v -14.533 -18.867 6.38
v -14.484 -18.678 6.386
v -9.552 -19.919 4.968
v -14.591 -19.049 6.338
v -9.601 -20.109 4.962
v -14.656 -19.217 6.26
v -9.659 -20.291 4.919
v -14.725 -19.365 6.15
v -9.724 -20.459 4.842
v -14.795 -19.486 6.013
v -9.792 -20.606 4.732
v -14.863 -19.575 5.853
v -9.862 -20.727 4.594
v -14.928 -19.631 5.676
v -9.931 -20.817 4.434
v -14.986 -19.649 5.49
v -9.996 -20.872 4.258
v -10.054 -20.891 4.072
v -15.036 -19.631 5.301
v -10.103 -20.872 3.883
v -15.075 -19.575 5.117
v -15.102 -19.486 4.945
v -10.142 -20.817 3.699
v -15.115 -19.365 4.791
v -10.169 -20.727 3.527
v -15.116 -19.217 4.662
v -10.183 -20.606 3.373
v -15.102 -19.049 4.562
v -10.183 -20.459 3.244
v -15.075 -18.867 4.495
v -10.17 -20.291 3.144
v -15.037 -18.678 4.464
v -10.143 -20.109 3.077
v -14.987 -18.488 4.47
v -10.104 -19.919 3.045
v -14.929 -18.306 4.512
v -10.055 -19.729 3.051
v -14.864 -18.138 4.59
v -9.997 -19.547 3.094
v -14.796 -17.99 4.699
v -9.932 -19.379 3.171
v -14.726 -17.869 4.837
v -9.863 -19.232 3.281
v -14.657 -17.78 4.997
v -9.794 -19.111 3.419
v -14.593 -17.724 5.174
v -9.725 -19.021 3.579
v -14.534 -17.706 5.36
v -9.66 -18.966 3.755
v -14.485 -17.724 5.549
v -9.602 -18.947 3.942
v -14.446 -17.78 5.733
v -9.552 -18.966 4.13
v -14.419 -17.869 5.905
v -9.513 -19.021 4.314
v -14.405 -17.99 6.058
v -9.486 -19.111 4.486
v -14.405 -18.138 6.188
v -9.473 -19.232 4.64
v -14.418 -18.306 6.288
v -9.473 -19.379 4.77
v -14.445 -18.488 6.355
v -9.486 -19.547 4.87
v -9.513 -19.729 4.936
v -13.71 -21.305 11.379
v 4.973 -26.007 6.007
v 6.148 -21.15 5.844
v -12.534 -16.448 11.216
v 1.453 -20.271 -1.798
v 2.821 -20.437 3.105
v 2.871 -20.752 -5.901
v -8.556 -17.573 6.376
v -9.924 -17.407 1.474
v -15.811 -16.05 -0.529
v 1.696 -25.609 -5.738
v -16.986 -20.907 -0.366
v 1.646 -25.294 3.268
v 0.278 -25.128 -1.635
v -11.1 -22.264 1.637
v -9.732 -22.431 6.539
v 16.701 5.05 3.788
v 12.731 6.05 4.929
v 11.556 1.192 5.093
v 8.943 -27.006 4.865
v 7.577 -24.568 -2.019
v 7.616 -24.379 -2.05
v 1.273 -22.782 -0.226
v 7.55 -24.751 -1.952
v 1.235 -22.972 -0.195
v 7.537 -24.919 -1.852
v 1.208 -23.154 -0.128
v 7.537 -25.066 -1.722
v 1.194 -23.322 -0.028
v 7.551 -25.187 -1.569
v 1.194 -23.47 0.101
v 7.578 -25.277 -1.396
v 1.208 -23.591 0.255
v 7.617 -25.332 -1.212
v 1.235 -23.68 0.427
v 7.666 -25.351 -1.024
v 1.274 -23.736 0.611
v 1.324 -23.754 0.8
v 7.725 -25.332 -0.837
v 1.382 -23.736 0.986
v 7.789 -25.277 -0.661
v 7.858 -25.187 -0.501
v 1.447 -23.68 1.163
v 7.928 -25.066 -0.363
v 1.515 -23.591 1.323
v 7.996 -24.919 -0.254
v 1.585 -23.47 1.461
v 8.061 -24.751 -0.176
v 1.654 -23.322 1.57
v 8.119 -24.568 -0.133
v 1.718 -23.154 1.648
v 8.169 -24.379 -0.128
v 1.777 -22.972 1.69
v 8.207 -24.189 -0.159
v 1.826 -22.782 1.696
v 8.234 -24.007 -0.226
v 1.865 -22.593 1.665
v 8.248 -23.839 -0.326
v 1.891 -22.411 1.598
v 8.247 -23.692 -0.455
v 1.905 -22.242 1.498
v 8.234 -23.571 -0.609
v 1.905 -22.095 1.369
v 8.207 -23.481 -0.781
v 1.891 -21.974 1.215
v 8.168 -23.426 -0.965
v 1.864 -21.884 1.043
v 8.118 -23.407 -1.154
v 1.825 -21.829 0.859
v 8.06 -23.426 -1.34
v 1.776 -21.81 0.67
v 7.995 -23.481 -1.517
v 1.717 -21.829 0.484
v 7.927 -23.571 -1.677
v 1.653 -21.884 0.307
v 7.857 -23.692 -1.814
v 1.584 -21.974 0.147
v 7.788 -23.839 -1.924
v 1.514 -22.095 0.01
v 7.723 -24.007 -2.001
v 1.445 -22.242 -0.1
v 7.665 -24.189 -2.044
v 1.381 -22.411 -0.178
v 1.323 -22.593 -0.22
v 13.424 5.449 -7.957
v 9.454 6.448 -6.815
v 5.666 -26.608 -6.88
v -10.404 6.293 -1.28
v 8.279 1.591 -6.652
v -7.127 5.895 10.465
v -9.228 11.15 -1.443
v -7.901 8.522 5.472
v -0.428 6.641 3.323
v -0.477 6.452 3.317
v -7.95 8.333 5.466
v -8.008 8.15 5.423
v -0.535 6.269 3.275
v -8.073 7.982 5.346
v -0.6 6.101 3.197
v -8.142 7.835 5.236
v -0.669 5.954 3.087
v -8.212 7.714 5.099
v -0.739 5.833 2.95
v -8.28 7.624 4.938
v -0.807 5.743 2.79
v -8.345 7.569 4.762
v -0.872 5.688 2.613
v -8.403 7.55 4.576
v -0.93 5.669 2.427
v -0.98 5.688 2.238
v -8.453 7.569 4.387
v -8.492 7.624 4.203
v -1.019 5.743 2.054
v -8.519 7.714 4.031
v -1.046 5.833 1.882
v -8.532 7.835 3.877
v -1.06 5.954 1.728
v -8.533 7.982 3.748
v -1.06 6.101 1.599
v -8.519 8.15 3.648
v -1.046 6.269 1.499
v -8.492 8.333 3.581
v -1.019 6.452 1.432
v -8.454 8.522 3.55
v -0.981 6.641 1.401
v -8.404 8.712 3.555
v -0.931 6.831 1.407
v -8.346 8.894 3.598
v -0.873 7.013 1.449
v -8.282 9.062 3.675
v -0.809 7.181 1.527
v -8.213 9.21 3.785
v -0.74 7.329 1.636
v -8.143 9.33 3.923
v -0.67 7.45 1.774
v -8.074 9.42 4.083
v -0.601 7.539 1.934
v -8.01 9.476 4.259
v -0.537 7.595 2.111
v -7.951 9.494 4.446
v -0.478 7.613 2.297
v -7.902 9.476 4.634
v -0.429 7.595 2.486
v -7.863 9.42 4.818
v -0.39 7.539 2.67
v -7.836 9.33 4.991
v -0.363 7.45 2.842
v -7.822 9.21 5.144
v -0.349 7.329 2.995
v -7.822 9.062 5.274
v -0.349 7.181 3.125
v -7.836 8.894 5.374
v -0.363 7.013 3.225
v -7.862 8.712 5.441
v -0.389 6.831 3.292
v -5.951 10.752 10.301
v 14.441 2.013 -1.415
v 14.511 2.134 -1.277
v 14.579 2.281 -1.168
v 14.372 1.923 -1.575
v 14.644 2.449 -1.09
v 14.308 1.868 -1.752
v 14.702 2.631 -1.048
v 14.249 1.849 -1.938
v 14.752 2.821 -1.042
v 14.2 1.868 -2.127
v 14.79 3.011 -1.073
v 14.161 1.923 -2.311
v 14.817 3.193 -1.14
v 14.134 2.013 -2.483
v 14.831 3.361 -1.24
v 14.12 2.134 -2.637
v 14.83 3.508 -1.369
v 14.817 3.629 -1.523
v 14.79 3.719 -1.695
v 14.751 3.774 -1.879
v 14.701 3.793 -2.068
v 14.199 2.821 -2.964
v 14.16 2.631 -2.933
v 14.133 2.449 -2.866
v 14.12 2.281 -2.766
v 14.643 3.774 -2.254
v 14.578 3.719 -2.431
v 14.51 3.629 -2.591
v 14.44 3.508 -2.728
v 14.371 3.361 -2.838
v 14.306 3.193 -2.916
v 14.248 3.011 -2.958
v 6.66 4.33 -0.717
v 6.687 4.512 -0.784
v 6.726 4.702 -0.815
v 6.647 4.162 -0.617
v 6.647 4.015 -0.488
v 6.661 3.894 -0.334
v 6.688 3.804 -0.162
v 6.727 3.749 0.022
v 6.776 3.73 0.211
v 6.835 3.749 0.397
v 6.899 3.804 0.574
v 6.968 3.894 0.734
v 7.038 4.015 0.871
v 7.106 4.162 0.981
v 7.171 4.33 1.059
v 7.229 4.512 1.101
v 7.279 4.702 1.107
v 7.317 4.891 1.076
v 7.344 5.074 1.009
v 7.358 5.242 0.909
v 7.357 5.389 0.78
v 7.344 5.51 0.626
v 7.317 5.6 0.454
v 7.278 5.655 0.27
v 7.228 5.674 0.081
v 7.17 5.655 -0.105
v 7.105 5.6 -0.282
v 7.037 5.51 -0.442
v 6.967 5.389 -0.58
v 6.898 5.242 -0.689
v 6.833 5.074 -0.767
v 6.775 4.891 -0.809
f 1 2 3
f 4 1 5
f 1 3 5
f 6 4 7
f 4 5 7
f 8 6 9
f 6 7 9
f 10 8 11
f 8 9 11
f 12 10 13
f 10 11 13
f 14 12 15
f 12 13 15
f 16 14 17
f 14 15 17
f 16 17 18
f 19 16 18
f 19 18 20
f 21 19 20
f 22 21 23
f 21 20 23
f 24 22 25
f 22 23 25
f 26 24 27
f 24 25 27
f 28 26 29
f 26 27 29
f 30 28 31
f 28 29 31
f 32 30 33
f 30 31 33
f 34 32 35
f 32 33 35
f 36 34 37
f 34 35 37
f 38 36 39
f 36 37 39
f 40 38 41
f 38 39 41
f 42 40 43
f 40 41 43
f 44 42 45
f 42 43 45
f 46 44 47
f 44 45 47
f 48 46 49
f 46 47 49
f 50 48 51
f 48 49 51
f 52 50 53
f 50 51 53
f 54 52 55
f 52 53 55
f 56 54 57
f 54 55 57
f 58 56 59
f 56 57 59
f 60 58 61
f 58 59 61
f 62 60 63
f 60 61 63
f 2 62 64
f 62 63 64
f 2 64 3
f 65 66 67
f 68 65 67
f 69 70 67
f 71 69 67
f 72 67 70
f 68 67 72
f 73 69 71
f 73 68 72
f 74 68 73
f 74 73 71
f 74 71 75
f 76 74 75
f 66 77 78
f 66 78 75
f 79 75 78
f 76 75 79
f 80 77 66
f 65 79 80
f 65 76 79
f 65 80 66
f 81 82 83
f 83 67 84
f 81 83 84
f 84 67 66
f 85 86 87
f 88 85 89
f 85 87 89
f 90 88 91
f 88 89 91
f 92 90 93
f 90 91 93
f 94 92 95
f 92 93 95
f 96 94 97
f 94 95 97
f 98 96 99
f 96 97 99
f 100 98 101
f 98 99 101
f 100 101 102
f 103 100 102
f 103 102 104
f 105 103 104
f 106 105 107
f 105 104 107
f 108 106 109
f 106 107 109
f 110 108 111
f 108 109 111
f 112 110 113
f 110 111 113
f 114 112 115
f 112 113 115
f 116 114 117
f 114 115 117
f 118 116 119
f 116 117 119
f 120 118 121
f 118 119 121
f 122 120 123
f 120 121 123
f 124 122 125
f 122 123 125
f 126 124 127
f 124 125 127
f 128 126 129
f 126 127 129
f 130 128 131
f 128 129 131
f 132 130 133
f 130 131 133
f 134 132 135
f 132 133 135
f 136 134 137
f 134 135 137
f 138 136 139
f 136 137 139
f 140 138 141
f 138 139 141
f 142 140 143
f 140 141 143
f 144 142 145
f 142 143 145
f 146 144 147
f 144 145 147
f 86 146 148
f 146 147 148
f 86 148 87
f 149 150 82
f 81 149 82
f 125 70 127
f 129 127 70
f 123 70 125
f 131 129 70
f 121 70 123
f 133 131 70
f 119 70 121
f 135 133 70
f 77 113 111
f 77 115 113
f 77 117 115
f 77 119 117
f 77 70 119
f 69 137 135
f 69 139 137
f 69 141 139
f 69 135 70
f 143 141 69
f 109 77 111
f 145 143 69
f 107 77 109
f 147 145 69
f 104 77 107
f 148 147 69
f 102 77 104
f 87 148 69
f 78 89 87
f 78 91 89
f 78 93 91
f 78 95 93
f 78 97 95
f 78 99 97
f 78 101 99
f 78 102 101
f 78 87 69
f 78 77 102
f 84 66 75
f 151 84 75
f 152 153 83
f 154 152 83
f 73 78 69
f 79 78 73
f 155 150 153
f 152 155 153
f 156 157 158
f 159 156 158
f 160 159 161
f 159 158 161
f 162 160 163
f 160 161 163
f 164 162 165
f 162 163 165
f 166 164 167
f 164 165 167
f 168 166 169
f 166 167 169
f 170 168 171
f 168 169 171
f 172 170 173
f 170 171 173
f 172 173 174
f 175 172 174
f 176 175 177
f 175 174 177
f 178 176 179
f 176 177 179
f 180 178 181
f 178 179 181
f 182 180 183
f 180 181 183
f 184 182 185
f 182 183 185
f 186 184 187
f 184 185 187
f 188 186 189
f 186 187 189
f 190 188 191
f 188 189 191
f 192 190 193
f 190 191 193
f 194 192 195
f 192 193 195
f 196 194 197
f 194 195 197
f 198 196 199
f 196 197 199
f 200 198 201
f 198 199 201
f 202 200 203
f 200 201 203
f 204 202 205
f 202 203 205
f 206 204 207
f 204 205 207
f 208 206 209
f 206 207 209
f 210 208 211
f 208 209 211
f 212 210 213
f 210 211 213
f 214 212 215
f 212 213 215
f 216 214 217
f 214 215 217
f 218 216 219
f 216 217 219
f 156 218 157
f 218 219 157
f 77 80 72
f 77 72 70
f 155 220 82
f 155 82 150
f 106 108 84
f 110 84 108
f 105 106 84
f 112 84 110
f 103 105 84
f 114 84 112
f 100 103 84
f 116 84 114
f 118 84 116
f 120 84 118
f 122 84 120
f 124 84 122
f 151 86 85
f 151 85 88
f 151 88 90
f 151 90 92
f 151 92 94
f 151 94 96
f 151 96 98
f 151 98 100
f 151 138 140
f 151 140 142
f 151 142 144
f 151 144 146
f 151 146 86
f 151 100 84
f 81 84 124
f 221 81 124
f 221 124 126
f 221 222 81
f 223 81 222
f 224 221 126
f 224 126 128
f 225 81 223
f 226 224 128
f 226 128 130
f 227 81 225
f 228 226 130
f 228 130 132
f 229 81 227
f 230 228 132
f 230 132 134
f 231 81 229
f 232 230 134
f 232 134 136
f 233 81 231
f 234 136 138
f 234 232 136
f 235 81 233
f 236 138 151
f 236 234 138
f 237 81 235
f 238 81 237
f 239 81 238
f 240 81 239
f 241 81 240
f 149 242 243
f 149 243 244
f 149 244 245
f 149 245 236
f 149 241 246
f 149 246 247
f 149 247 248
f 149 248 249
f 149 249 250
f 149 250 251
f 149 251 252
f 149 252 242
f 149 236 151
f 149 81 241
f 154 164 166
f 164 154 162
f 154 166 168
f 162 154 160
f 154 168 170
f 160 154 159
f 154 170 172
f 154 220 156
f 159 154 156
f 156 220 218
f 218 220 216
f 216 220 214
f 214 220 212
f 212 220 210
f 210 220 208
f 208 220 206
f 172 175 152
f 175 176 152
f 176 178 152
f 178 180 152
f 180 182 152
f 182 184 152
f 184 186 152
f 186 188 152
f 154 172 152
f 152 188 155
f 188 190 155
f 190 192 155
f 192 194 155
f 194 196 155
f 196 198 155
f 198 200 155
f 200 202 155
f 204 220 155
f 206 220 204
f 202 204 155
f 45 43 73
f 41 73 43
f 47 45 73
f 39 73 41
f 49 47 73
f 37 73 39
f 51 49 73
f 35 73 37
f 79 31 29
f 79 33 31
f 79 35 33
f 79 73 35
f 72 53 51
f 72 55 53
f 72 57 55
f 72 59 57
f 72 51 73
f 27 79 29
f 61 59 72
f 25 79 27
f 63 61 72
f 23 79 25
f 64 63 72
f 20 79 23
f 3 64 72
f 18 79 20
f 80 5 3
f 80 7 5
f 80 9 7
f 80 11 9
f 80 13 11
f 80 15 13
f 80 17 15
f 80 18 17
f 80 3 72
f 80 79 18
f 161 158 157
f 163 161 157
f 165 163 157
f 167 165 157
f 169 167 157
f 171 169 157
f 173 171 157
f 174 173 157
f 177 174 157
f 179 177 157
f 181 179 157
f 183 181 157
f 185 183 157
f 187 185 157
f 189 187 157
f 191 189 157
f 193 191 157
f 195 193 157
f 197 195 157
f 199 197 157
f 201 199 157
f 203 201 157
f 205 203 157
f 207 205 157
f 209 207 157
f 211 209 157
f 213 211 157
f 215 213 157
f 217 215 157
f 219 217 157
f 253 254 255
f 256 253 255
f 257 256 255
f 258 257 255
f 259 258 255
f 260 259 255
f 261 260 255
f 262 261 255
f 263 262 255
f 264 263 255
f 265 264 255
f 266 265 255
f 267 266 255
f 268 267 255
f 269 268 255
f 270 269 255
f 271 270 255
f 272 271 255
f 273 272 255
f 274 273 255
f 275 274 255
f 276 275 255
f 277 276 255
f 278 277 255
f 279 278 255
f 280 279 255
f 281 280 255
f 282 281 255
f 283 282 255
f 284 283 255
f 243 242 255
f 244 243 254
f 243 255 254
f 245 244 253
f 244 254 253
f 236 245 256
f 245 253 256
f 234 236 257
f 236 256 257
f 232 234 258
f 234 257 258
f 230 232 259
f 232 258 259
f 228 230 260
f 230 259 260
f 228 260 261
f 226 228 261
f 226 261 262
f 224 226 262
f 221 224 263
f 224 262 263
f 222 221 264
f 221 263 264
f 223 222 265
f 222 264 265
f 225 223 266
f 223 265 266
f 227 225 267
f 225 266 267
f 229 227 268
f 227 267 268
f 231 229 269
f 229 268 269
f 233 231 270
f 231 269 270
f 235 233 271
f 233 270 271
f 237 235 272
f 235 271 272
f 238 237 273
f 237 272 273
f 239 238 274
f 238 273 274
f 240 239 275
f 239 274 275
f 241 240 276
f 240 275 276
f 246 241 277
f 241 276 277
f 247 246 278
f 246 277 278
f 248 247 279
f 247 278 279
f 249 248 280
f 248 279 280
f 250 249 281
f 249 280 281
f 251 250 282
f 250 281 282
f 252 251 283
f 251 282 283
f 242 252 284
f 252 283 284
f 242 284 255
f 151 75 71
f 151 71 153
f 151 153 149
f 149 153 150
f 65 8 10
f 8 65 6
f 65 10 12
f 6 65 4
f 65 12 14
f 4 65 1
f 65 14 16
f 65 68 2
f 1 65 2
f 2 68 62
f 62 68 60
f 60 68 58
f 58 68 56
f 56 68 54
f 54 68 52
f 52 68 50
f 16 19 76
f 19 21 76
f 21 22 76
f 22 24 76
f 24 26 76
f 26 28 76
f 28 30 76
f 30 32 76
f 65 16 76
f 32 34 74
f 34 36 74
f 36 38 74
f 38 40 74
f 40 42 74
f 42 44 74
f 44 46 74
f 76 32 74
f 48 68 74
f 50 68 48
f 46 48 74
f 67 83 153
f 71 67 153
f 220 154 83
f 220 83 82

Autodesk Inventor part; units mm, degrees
ref_plane "YZ Plane" through (0, 0, 0) normal (1, 0, 0) x (0, 1, 0)
ref_plane "Work Plane10" through (-7.1266, 5.8946, 10.4647) normal (0.9341198, -0.2351055, -0.2685995) x (-0.2685995, 0.0326501, -0.9626984)
sketch "Sketch2" plane through (-7.1266, 5.8946, 10.4647) normal (0.9341198, -0.2351055, -0.2685995) x (-0.2685995, 0.0326501, -0.9626984)
  line L0 (0, 5) -> (12.2, 5)
  line L1 (12.2, 5) -> (12.2, 0)
  line L2 (12.2, 0) -> (0, 0)
  line L3 (0, 0) -> (0, 5)
  line L4 (12.2, -28) -> (0, -28)
  line L5 (0, -28) -> (0, -23)
  line L6 (0, -23) -> (12.2, -23)
  line L7 (12.2, -23) -> (12.2, -28)
  point P0 (7.9677, -3.709)
extrude "Extrusion2" add sketch "Sketch2" along normal blind 20
ref_plane "Work Plane12" through (-19.3217, -20.3191, 0.3055) normal (-0.2351055, -0.9714213, 0.0326501) x (0.9341198, -0.2351055, -0.2685995)
sketch "Sketch4" plane through (-19.3217, -20.3191, 0.3055) normal (-0.2351055, -0.9714213, 0.0326501) x (0.9341198, -0.2351055, -0.2685995)
  line L0 (7.7802, 8.6462) -> (19.9601, 8.6462)
  line L1 (19.9601, 8.6462) -> (19.9601, 3.5538)
  line L2 (19.9601, 3.5538) -> (7.7802, 3.5538)
  line L3 (7.7802, 3.5538) -> (7.7802, 8.6462)
  line L4 (43.7973, 6.1) -> (-30.4435, 6.1) projected
  point P0 (13.3537, 4.2323)
  point P1 (7.7802, 6.1)
extrude "Extrusion4" cut sketch "Sketch4" against normal up to surface (5 mm away)
ref_plane "Work Plane11" through (11.5558, 1.1925, 5.0927) normal (0.9341198, -0.2351055, -0.2685995) x (-0.2685995, 0.0326501, -0.9626984)
sketch "Sketch5" plane through (11.5558, 1.1925, 5.0927) normal (0.9341198, -0.2351055, -0.2685995) x (-0.2685995, 0.0326501, -0.9626984)
  line L0 (12.2, 5) -> (0, 5)
  line L1 (0, 5) -> (0, -28)
  line L2 (0, -28) -> (12.2, -28)
  line L3 (12.2, -28) -> (12.2, 5)
  point P0 (7.9677, -3.709)
extrude "Extrusion5" add sketch "Sketch5" along normal blind 4.25
hole "Hole1" at (-14.7602, -18.6775, 5.4248) direction (0.9341198, -0.2351055, -0.2685995) diameter 2 depth 8 tip angle 118
hole "Hole3" at (-8.1773, 8.5223, 4.5106) direction (0.9341198, -0.2351055, -0.2685995) diameter 2 depth 8 tip angle 118
thread "Thread1" size "M2x0.4" class "6H" standard "ANSI Metric M Profile" full length
thread "Thread2" size "M2x0.4" class "6H" standard "ANSI Metric M Profile" full length
hole "Hole4" at (7.8922, -24.3788, -1.0887) direction (-0.9341198, 0.2351055, 0.2685995) diameter 2 depth 8 tip angle 118
hole "Hole5" at (14.4752, 2.821, -2.0029) direction (-0.9341198, 0.2351055, 0.2685995) diameter 2 depth 8 tip angle 118
thread "Thread3" size "M2x0.4" class "6H" standard "ANSI Metric M Profile" full length
properties part number "servo_attachement"
